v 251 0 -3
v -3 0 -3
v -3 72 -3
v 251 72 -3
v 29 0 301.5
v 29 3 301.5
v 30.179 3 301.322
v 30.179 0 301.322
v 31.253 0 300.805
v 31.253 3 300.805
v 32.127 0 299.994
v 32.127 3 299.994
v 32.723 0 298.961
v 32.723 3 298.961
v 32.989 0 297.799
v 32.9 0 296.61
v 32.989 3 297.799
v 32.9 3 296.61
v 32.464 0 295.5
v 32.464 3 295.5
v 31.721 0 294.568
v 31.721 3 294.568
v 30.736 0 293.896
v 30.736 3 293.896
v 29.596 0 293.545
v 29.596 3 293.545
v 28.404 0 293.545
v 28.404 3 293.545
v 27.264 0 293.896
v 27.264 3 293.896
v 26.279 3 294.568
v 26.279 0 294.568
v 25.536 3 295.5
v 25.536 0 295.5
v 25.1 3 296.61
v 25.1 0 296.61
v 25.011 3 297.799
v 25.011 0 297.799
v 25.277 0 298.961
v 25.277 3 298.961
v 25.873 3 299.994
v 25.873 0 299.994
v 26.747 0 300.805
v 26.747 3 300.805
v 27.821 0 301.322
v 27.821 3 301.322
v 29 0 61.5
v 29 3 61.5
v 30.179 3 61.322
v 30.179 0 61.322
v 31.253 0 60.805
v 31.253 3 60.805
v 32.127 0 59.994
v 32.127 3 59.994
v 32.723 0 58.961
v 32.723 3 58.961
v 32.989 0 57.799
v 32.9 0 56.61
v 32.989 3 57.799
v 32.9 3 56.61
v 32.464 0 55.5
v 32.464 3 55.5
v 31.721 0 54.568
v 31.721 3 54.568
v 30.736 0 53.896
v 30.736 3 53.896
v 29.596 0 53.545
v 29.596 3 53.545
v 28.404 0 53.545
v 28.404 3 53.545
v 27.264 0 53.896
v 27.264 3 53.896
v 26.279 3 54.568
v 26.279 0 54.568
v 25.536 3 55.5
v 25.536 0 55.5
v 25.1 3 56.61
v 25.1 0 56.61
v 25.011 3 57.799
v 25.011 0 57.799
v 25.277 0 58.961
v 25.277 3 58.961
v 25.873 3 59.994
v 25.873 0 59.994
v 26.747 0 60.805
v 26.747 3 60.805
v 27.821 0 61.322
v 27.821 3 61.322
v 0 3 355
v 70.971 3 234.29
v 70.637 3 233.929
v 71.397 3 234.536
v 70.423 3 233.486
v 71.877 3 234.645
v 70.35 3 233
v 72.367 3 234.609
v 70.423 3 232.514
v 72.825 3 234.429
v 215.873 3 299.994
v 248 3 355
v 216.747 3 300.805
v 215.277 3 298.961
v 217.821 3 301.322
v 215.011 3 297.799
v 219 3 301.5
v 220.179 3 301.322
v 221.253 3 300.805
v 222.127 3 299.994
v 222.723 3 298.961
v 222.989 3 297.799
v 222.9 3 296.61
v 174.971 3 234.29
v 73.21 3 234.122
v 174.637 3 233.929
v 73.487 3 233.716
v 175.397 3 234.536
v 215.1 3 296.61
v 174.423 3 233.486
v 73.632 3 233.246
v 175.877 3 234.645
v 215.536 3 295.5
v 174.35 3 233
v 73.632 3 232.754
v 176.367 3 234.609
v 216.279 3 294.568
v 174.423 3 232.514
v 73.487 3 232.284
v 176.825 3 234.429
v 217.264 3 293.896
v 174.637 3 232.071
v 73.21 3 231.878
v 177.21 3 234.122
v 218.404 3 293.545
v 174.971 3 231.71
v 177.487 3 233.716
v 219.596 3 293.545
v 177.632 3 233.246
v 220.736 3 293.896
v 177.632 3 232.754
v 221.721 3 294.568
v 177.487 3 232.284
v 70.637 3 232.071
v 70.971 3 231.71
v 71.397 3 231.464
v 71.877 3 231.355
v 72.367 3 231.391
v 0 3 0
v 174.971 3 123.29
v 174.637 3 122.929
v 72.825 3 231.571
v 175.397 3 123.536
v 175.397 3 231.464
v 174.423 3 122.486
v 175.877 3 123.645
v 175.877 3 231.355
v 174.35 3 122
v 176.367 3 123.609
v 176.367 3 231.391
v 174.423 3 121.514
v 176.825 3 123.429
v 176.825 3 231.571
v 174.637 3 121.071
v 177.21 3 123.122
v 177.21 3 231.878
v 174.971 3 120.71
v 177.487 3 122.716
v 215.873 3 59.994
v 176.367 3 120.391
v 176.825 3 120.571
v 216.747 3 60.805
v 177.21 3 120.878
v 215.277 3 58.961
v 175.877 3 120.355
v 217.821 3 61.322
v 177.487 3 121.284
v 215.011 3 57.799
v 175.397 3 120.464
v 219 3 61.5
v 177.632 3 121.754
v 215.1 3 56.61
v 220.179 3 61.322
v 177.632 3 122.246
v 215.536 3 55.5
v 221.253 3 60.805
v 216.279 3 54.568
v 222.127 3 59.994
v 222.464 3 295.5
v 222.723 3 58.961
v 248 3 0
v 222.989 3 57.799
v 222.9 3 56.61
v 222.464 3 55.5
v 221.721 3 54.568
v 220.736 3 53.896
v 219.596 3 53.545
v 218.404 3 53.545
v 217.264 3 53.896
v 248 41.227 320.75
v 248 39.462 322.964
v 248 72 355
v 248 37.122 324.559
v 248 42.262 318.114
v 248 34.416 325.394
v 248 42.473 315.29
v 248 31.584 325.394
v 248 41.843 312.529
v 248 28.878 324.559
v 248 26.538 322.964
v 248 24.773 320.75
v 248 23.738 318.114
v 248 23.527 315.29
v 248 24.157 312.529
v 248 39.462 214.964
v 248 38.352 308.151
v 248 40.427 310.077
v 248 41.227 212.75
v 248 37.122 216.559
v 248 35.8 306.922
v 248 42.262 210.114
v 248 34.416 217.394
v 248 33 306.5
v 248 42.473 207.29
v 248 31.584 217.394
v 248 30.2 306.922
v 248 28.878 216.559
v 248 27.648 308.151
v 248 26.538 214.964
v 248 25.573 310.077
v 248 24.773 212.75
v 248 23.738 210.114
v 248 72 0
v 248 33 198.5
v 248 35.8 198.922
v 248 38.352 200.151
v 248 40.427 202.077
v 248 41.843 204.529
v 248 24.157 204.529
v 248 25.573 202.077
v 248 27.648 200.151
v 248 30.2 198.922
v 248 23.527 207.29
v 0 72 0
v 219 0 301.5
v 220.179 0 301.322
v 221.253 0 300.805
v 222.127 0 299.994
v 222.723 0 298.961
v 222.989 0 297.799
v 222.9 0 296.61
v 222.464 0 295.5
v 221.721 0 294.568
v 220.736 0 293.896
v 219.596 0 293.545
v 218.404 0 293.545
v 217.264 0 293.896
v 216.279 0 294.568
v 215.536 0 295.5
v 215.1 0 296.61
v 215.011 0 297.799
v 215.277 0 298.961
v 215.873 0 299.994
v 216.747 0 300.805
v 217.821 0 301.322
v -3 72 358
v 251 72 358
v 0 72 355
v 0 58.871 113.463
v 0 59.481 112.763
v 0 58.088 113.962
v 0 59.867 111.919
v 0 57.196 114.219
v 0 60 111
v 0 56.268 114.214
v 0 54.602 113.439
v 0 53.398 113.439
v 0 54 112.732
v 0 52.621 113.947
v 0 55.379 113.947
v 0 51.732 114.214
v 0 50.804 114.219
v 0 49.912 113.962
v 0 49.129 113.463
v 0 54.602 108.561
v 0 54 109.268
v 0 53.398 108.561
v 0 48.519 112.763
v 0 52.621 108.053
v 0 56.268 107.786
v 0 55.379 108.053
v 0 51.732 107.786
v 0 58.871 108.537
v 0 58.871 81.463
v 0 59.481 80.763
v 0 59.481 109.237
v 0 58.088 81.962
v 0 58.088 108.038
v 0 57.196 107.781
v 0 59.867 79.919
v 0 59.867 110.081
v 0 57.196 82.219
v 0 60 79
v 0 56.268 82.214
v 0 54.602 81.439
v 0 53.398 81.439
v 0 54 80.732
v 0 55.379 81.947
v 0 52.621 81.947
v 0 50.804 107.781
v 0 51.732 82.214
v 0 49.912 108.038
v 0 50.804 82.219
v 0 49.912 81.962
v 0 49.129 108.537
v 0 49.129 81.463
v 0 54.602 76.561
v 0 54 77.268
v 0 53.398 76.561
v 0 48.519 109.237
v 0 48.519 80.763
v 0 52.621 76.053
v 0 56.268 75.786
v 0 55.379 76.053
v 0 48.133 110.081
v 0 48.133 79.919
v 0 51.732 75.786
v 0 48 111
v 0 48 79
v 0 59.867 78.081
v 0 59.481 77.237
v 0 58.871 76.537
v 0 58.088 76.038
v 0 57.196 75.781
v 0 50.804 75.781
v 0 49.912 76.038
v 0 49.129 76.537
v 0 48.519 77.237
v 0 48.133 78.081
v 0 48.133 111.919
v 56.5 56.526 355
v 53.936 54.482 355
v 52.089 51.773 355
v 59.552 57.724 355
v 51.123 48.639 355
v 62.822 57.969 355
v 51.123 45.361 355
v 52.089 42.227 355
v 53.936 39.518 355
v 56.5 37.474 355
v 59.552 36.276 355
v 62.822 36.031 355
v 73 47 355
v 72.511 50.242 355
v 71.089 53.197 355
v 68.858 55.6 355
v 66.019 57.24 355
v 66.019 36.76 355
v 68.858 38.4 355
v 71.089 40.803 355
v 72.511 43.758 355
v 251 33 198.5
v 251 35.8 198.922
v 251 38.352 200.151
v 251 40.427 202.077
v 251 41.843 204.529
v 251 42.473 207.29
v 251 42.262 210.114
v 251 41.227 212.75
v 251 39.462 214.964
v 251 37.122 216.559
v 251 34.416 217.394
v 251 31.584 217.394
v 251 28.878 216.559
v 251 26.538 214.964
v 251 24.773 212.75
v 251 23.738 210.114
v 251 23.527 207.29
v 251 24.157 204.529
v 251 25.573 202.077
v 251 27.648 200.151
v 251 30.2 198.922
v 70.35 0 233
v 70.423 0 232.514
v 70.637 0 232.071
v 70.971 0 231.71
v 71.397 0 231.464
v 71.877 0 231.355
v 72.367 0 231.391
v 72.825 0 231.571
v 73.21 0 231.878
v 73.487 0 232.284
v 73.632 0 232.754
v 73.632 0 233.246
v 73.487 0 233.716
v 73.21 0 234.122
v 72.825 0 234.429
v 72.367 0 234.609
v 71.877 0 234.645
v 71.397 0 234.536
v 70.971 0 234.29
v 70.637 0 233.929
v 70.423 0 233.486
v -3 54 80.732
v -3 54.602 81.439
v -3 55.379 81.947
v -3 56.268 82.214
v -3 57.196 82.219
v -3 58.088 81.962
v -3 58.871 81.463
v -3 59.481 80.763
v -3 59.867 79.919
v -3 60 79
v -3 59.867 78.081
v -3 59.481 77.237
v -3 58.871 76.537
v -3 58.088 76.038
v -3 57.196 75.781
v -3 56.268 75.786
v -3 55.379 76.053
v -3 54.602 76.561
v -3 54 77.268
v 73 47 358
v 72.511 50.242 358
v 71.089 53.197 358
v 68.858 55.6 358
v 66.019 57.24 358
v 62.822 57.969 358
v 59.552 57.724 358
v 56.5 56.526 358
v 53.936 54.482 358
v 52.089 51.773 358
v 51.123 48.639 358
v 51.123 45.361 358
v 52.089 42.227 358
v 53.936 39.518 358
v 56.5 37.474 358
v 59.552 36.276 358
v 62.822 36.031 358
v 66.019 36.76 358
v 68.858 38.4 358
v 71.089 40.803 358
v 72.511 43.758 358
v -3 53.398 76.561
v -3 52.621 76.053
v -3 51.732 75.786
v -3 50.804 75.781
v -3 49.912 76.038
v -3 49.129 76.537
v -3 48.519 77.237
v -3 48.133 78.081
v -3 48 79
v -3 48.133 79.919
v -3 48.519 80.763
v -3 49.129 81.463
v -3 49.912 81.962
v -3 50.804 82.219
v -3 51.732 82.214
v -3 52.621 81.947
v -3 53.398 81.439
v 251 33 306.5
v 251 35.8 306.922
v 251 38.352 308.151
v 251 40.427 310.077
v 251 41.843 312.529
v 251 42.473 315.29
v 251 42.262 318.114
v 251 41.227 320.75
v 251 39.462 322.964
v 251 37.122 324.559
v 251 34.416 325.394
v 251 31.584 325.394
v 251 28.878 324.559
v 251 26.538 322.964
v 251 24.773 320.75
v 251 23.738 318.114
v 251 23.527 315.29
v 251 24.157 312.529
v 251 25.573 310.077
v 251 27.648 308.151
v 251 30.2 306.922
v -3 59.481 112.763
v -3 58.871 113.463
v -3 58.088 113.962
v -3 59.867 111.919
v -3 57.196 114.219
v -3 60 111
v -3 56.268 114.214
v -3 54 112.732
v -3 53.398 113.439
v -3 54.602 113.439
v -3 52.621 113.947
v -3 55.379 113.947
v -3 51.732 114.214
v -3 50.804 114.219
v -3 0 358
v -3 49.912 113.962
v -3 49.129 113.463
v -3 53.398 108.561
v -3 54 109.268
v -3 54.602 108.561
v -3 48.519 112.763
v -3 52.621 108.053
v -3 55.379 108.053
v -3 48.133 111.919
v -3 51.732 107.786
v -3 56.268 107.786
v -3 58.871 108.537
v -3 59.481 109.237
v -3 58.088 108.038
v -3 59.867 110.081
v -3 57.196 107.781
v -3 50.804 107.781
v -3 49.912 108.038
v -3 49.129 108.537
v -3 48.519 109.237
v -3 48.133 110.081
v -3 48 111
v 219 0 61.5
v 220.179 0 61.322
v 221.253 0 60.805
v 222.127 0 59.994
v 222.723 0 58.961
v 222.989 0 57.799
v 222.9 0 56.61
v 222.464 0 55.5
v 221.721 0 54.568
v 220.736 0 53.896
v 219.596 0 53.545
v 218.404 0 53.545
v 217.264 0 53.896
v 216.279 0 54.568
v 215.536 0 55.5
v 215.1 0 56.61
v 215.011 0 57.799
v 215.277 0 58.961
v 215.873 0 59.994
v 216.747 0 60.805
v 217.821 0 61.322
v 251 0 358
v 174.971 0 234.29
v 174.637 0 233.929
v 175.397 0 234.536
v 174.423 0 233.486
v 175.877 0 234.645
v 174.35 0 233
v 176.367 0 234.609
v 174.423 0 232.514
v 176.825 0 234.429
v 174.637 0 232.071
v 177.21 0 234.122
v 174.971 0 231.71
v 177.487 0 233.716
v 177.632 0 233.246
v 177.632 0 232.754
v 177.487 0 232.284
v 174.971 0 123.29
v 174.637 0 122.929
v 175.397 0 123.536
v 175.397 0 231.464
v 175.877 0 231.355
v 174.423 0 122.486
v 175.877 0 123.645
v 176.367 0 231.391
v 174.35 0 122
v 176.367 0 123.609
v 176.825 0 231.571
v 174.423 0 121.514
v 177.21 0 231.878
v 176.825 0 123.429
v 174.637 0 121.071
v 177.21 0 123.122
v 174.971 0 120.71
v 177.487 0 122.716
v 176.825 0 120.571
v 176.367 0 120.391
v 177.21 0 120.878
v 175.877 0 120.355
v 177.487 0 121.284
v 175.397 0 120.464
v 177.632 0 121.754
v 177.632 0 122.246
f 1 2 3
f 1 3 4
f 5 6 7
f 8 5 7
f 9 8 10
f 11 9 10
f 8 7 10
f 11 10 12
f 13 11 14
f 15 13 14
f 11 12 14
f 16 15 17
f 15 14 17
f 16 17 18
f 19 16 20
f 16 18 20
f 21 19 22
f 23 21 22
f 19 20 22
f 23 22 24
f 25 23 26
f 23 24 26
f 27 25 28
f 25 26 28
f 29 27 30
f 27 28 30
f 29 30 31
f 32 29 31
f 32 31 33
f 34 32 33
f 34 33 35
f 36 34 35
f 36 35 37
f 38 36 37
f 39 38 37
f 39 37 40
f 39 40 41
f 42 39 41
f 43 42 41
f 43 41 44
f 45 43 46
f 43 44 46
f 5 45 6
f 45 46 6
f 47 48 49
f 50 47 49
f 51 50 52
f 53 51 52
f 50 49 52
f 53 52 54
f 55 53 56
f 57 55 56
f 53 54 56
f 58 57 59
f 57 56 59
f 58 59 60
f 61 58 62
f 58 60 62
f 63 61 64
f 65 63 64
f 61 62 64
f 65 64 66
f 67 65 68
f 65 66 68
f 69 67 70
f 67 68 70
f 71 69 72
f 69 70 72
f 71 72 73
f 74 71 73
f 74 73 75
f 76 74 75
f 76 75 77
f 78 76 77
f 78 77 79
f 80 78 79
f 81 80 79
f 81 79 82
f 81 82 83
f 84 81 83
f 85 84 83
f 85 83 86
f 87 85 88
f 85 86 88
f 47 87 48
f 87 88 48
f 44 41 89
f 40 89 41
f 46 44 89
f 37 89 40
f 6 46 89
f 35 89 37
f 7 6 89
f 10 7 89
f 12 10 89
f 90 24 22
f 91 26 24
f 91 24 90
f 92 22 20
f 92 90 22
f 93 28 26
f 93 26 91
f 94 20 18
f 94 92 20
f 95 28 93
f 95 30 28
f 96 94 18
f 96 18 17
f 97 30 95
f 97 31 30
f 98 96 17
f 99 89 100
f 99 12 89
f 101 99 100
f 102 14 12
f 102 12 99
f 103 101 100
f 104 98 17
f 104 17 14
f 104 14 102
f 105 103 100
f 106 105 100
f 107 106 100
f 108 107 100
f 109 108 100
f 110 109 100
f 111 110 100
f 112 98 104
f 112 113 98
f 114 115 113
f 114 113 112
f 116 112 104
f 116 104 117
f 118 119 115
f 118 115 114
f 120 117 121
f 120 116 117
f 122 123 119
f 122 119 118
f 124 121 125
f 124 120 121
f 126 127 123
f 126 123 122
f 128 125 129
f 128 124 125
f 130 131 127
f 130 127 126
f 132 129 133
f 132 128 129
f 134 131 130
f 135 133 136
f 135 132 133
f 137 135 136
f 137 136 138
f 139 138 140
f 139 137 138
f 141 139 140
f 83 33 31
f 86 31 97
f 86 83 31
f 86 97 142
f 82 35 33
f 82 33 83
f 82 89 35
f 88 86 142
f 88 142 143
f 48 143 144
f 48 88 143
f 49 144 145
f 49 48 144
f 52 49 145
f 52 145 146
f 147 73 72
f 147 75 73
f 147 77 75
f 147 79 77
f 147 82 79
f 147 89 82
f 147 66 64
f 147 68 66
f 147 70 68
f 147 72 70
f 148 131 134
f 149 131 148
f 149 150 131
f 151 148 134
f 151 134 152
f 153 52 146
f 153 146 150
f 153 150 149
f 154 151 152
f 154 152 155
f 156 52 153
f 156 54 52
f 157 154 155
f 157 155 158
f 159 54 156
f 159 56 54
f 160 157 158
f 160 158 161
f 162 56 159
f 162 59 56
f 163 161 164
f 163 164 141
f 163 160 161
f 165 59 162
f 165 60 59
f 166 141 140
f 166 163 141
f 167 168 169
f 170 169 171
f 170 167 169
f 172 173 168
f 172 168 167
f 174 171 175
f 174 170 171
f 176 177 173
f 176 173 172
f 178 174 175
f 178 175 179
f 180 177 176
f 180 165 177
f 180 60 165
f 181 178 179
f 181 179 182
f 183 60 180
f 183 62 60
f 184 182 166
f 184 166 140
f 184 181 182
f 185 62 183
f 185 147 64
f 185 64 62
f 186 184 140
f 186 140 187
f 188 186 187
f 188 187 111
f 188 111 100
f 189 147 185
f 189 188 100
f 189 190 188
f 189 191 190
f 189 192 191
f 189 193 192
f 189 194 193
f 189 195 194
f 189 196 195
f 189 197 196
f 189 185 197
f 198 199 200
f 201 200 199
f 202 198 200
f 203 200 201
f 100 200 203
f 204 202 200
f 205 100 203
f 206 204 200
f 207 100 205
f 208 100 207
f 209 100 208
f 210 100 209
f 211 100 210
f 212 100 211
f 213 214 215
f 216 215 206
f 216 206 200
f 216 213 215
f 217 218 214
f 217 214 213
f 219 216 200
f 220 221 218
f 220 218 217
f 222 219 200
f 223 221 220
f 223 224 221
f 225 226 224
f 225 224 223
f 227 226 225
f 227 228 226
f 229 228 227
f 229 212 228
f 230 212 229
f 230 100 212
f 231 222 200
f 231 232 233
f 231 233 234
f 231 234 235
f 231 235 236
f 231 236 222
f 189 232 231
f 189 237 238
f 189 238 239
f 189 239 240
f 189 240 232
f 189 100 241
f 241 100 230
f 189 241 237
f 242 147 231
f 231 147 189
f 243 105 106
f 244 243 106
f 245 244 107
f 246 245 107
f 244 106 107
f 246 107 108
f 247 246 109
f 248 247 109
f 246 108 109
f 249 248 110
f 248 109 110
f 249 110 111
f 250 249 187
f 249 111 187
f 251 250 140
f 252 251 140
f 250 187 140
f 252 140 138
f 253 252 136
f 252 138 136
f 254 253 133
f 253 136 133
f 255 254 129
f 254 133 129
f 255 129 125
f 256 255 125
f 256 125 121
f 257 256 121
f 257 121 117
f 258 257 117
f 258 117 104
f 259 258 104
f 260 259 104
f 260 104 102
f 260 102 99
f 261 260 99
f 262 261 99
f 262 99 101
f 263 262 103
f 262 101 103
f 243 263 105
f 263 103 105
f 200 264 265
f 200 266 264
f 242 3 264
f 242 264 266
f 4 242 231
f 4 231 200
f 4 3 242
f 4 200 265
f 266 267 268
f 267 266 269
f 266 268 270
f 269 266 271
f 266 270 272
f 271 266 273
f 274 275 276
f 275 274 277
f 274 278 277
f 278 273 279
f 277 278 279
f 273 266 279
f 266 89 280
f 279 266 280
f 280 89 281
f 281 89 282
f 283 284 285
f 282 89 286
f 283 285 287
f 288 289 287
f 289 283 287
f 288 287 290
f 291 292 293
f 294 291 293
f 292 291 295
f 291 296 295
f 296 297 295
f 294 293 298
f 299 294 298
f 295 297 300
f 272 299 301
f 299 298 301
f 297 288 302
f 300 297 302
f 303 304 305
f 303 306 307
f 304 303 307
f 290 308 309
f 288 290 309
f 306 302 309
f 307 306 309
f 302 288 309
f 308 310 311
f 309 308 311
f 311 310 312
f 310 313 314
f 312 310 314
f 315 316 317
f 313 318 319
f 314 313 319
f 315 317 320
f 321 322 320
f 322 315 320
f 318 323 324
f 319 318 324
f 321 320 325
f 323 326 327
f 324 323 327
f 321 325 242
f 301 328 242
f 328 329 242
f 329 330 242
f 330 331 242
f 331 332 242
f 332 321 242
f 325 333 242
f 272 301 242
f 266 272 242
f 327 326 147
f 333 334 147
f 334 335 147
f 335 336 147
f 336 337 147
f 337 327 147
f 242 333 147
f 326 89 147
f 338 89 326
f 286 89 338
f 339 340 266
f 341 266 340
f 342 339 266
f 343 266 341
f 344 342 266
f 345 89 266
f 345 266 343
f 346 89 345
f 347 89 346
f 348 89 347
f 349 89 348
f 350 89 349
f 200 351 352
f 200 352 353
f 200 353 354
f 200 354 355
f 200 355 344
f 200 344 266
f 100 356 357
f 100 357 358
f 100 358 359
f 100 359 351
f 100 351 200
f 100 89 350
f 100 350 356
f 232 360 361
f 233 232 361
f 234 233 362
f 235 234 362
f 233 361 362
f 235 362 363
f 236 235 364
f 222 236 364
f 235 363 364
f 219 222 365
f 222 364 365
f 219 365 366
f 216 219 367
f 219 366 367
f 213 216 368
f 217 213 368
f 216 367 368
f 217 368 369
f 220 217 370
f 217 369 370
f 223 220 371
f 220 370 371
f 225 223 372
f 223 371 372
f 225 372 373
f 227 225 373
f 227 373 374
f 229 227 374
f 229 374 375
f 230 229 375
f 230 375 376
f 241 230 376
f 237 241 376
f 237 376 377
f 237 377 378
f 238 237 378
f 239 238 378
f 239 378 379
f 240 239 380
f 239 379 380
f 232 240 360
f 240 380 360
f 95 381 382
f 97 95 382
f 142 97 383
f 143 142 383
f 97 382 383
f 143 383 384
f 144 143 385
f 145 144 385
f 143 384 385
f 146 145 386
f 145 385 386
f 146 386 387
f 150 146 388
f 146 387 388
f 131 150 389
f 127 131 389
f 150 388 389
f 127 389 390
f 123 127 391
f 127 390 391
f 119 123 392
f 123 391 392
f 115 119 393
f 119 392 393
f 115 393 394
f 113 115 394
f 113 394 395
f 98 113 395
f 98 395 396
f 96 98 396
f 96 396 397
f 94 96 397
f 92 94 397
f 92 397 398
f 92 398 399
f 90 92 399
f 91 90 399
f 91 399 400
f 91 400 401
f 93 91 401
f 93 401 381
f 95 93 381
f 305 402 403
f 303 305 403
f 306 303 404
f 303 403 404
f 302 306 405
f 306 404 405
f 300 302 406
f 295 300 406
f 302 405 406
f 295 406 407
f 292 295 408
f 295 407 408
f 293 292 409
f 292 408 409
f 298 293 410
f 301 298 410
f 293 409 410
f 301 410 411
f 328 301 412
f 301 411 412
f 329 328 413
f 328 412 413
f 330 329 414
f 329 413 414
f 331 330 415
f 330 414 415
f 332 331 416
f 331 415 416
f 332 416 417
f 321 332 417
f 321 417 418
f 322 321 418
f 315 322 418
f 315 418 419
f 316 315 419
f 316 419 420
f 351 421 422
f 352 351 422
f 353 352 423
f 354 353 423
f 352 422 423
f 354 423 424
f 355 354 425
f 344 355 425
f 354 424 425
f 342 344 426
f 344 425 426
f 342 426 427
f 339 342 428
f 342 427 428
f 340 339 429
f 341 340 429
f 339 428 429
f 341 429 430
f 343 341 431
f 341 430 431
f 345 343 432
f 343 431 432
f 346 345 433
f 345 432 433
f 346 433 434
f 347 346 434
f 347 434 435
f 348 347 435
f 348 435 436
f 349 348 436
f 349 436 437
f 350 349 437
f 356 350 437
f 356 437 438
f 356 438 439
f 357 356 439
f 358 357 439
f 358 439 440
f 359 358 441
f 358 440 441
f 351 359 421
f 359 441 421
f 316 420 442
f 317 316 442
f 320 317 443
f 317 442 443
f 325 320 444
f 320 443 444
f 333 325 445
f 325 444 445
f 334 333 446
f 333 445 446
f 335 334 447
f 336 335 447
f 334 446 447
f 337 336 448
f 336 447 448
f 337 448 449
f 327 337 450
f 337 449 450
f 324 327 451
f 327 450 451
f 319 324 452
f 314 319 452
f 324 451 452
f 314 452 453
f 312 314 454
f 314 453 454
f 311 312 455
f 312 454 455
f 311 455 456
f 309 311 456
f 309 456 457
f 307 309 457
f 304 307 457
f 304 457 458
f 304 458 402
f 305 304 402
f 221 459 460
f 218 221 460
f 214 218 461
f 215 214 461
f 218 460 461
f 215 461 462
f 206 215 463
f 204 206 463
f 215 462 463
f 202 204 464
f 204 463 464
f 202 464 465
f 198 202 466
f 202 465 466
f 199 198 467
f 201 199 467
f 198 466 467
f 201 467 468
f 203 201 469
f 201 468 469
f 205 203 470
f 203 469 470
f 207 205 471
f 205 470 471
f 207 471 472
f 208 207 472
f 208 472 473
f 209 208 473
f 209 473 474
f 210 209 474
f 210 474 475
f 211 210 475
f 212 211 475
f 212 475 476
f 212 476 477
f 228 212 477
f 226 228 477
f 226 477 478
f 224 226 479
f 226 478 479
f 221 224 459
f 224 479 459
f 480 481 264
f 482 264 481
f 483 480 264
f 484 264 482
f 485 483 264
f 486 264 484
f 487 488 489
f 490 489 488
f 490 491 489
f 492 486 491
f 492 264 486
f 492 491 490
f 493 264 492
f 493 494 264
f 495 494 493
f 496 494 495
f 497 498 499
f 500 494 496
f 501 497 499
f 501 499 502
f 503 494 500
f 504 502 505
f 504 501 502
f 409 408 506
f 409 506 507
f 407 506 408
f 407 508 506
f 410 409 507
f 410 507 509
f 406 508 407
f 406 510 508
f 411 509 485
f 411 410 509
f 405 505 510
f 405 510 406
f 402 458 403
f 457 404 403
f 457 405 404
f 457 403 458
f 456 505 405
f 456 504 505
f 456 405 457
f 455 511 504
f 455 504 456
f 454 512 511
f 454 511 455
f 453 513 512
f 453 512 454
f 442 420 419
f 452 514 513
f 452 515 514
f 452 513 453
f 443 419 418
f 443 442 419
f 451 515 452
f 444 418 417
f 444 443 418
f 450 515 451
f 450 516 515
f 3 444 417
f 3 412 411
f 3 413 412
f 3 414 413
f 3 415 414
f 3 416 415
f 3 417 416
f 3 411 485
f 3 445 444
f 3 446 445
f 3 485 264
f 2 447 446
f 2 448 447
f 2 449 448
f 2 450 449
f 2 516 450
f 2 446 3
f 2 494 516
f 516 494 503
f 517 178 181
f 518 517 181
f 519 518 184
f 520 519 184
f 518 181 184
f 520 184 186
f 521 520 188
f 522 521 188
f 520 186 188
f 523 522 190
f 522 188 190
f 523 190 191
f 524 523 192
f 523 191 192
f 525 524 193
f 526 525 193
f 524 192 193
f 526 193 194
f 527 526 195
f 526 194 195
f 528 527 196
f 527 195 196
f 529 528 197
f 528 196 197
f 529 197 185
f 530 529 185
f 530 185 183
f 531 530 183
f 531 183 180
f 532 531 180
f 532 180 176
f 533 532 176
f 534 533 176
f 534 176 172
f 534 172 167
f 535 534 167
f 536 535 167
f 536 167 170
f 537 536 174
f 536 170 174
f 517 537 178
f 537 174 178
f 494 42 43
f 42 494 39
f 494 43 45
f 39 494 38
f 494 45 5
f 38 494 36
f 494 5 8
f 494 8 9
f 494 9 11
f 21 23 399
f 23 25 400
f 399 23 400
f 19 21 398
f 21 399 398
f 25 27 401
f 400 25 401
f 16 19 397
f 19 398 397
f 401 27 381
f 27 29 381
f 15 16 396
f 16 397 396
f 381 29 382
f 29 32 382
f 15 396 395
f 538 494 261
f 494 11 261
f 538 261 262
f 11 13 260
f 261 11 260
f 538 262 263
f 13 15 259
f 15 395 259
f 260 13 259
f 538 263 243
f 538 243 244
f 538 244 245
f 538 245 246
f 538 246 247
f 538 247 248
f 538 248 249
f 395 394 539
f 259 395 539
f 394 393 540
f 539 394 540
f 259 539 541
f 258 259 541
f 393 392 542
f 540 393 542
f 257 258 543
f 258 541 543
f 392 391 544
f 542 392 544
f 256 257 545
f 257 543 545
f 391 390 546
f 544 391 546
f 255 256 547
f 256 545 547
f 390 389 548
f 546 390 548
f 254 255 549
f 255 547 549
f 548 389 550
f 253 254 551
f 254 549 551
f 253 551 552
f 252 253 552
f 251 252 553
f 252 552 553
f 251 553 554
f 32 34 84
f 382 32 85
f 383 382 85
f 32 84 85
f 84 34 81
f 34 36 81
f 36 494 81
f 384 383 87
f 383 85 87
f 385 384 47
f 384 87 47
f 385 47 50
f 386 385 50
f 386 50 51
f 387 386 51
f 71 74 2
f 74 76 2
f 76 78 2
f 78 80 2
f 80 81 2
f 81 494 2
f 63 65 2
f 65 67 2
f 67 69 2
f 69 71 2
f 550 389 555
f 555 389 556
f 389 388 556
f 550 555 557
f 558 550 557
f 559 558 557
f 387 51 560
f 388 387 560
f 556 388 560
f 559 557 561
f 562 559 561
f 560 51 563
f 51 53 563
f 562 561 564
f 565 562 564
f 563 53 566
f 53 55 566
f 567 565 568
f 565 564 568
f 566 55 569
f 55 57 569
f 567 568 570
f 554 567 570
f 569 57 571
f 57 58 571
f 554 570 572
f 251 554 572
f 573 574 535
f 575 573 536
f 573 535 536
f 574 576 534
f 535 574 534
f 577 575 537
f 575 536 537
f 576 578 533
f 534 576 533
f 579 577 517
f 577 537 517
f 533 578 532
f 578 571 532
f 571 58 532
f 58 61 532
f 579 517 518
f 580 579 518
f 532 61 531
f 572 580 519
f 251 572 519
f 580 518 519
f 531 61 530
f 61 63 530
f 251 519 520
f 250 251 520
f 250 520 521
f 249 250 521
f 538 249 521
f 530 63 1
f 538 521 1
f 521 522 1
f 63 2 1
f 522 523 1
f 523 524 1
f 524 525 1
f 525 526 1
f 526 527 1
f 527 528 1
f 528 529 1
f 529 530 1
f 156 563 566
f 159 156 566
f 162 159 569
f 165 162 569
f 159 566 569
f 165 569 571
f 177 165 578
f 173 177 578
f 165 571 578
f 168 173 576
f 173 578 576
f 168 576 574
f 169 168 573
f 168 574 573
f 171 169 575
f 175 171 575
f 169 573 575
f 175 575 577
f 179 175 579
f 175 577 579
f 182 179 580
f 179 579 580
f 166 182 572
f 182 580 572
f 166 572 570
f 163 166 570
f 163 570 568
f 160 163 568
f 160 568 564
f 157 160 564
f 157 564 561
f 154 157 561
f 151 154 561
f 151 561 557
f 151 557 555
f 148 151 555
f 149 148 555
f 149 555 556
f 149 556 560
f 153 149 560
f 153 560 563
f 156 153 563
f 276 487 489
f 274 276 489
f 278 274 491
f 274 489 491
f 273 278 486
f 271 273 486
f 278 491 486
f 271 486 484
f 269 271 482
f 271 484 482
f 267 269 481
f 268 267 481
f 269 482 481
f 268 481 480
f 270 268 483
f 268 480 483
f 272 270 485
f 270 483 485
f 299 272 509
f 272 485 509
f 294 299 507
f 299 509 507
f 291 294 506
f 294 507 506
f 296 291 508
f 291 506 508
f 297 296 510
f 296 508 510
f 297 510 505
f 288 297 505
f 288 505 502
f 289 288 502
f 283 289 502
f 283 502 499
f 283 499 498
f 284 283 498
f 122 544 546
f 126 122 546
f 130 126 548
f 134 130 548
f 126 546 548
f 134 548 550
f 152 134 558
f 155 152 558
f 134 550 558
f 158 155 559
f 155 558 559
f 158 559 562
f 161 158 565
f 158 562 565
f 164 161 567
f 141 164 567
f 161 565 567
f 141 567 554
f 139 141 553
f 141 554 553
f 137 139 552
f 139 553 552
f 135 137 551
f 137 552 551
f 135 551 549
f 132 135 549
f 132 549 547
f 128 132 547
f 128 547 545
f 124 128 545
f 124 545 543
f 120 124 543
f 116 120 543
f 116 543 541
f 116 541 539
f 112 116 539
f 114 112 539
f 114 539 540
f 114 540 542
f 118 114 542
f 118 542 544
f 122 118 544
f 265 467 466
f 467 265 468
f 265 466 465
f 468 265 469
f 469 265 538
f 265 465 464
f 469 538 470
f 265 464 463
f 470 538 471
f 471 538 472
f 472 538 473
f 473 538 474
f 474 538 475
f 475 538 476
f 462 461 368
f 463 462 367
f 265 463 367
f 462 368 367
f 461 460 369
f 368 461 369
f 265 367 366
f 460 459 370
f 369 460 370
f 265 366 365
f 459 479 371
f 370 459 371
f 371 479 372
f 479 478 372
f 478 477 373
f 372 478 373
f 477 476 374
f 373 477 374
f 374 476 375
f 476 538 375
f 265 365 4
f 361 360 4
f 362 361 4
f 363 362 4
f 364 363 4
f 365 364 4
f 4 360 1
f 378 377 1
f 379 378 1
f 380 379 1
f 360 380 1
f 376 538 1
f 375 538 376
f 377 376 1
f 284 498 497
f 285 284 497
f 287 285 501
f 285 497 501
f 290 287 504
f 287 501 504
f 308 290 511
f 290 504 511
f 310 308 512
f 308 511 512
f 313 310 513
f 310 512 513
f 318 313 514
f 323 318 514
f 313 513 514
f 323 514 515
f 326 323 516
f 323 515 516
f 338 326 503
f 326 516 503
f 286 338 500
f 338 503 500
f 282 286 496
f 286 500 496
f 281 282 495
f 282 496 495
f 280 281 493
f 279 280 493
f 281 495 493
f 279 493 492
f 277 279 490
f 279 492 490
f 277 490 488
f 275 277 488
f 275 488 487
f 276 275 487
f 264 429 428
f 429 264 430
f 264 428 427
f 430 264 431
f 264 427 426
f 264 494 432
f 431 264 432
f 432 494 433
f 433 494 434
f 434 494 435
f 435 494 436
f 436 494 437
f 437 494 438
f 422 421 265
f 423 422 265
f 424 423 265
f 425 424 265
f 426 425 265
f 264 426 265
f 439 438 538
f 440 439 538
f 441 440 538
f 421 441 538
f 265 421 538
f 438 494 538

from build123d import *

# Parameters (mm, degrees)
SKETCH1_W             = 254
SKETCH1_H             = 361
SKETCH1_W_2           = 248
SKETCH1_H_2           = 355
BOSS_EXTRUDE1_DEPTH   = 3
BOSS_EXTRUDE2_START   = 3
SKETCH1_3_W           = 254
SKETCH1_3_H           = 361
SKETCH1_3_W_2         = 248
SKETCH1_3_H_2         = 355
BOSS_EXTRUDE2_DEPTH   = 69
SKETCH2_R             = 9.5
CUT_EXTRUDE1_DEPTH    = 3
SKETCH3_R             = 11
CUT_EXTRUDE2_DEPTH    = 3
SKETCH4_R             = 3.25
CUT_EXTRUDE3_DEPTH    = 3
SKETCH5_R             = 4
CUT_EXTRUDE4_DEPTH    = 3
M4X0_7_TAPPED_HOLE1_D = 3.3


with BuildPart() as part:
    # Sketch1 → Boss-Extrude1 (new body)
    # profile 1 of 2: a face of its own
    with BuildSketch(Plane(origin=(0, 0, 0), x_dir=(1, 0, 0), z_dir=(0, 1, 0))):
        with Locations((124, -177.5)):
            Rectangle(SKETCH1_W, SKETCH1_H)
        with Locations((124, -177.5)):
            Rectangle(SKETCH1_W_2, SKETCH1_H_2, mode=Mode.SUBTRACT)
    # profile 2 of 2: a face of its own
    with BuildSketch(Plane(origin=(0, 0, 0), x_dir=(1, 0, 0), z_dir=(0, 1, 0))):
        with Locations((124, -177.5)):
            Rectangle(SKETCH1_W_2, SKETCH1_H_2)
    extrude(amount=BOSS_EXTRUDE1_DEPTH)

    # Sketch1<3> → Boss-Extrude2 (add)
    with BuildSketch(Plane(origin=(0, 0, 0), x_dir=(1, 0, 0), z_dir=(0, 1, 0)).offset(BOSS_EXTRUDE2_START)):
        with Locations((124, -177.5)):
            Rectangle(SKETCH1_3_W, SKETCH1_3_H)
        with Locations((124, -177.5)):
            Rectangle(SKETCH1_3_W_2, SKETCH1_3_H_2, mode=Mode.SUBTRACT)
    extrude(amount=BOSS_EXTRUDE2_DEPTH)

    # Sketch2 → Cut-Extrude1 (cut)
    with BuildSketch(Plane(origin=(251, 0, 0), x_dir=(0, 0, -1), z_dir=(1, 0, 0))):
        with Locations((-316, 33)):
            Circle(SKETCH2_R)
        with Locations((-208, 33)):
            Circle(SKETCH2_R)
    extrude(amount=-CUT_EXTRUDE1_DEPTH, mode=Mode.SUBTRACT)

    # Sketch3 → Cut-Extrude2 (cut)
    with BuildSketch(Plane.XY.offset(358)):
        with Locations((62, 47)):
            Circle(SKETCH3_R)
    extrude(amount=-CUT_EXTRUDE2_DEPTH, mode=Mode.SUBTRACT)

    # Sketch4 → Cut-Extrude3 (cut)
    with BuildSketch(Plane.ZY.offset(3)):
        with Locations((79, 51.25)):
            Circle(SKETCH4_R)
        with Locations((79, 56.75)):
            Circle(SKETCH4_R)
        with Locations((111, 56.75)):
            Circle(SKETCH4_R)
        with Locations((111, 51.25)):
            Circle(SKETCH4_R)
    extrude(amount=-CUT_EXTRUDE3_DEPTH, mode=Mode.SUBTRACT)

    # Sketch5 → Cut-Extrude4 (cut)
    with BuildSketch(Plane(origin=(0, 3, 0), x_dir=(1, 0, 0), z_dir=(0, 1, 0))):
        with Locations(Location((29, -297.5, 0), (0, 0, 270))):
            Circle(SKETCH5_R)
        with Locations(Location((219, -297.5, 0), (0, 0, 270))):
            Circle(SKETCH5_R)
        with Locations(Location((29, -57.5, 0), (0, 0, 270))):
            Circle(SKETCH5_R)
        with Locations(Location((219, -57.5, 0), (0, 0, 270))):
            Circle(SKETCH5_R)
    extrude(amount=-CUT_EXTRUDE4_DEPTH, mode=Mode.SUBTRACT)

    # M4x0.7 Tapped Hole1 (through all)
    with Locations(Plane(origin=(0, 3, 0), x_dir=(1, 0, 0), z_dir=(0, 1, 0))):
        with Locations((72, -233), (176, -233), (176, -122)):
            Hole(M4X0_7_TAPPED_HOLE1_D / 2)


solid = part.part
